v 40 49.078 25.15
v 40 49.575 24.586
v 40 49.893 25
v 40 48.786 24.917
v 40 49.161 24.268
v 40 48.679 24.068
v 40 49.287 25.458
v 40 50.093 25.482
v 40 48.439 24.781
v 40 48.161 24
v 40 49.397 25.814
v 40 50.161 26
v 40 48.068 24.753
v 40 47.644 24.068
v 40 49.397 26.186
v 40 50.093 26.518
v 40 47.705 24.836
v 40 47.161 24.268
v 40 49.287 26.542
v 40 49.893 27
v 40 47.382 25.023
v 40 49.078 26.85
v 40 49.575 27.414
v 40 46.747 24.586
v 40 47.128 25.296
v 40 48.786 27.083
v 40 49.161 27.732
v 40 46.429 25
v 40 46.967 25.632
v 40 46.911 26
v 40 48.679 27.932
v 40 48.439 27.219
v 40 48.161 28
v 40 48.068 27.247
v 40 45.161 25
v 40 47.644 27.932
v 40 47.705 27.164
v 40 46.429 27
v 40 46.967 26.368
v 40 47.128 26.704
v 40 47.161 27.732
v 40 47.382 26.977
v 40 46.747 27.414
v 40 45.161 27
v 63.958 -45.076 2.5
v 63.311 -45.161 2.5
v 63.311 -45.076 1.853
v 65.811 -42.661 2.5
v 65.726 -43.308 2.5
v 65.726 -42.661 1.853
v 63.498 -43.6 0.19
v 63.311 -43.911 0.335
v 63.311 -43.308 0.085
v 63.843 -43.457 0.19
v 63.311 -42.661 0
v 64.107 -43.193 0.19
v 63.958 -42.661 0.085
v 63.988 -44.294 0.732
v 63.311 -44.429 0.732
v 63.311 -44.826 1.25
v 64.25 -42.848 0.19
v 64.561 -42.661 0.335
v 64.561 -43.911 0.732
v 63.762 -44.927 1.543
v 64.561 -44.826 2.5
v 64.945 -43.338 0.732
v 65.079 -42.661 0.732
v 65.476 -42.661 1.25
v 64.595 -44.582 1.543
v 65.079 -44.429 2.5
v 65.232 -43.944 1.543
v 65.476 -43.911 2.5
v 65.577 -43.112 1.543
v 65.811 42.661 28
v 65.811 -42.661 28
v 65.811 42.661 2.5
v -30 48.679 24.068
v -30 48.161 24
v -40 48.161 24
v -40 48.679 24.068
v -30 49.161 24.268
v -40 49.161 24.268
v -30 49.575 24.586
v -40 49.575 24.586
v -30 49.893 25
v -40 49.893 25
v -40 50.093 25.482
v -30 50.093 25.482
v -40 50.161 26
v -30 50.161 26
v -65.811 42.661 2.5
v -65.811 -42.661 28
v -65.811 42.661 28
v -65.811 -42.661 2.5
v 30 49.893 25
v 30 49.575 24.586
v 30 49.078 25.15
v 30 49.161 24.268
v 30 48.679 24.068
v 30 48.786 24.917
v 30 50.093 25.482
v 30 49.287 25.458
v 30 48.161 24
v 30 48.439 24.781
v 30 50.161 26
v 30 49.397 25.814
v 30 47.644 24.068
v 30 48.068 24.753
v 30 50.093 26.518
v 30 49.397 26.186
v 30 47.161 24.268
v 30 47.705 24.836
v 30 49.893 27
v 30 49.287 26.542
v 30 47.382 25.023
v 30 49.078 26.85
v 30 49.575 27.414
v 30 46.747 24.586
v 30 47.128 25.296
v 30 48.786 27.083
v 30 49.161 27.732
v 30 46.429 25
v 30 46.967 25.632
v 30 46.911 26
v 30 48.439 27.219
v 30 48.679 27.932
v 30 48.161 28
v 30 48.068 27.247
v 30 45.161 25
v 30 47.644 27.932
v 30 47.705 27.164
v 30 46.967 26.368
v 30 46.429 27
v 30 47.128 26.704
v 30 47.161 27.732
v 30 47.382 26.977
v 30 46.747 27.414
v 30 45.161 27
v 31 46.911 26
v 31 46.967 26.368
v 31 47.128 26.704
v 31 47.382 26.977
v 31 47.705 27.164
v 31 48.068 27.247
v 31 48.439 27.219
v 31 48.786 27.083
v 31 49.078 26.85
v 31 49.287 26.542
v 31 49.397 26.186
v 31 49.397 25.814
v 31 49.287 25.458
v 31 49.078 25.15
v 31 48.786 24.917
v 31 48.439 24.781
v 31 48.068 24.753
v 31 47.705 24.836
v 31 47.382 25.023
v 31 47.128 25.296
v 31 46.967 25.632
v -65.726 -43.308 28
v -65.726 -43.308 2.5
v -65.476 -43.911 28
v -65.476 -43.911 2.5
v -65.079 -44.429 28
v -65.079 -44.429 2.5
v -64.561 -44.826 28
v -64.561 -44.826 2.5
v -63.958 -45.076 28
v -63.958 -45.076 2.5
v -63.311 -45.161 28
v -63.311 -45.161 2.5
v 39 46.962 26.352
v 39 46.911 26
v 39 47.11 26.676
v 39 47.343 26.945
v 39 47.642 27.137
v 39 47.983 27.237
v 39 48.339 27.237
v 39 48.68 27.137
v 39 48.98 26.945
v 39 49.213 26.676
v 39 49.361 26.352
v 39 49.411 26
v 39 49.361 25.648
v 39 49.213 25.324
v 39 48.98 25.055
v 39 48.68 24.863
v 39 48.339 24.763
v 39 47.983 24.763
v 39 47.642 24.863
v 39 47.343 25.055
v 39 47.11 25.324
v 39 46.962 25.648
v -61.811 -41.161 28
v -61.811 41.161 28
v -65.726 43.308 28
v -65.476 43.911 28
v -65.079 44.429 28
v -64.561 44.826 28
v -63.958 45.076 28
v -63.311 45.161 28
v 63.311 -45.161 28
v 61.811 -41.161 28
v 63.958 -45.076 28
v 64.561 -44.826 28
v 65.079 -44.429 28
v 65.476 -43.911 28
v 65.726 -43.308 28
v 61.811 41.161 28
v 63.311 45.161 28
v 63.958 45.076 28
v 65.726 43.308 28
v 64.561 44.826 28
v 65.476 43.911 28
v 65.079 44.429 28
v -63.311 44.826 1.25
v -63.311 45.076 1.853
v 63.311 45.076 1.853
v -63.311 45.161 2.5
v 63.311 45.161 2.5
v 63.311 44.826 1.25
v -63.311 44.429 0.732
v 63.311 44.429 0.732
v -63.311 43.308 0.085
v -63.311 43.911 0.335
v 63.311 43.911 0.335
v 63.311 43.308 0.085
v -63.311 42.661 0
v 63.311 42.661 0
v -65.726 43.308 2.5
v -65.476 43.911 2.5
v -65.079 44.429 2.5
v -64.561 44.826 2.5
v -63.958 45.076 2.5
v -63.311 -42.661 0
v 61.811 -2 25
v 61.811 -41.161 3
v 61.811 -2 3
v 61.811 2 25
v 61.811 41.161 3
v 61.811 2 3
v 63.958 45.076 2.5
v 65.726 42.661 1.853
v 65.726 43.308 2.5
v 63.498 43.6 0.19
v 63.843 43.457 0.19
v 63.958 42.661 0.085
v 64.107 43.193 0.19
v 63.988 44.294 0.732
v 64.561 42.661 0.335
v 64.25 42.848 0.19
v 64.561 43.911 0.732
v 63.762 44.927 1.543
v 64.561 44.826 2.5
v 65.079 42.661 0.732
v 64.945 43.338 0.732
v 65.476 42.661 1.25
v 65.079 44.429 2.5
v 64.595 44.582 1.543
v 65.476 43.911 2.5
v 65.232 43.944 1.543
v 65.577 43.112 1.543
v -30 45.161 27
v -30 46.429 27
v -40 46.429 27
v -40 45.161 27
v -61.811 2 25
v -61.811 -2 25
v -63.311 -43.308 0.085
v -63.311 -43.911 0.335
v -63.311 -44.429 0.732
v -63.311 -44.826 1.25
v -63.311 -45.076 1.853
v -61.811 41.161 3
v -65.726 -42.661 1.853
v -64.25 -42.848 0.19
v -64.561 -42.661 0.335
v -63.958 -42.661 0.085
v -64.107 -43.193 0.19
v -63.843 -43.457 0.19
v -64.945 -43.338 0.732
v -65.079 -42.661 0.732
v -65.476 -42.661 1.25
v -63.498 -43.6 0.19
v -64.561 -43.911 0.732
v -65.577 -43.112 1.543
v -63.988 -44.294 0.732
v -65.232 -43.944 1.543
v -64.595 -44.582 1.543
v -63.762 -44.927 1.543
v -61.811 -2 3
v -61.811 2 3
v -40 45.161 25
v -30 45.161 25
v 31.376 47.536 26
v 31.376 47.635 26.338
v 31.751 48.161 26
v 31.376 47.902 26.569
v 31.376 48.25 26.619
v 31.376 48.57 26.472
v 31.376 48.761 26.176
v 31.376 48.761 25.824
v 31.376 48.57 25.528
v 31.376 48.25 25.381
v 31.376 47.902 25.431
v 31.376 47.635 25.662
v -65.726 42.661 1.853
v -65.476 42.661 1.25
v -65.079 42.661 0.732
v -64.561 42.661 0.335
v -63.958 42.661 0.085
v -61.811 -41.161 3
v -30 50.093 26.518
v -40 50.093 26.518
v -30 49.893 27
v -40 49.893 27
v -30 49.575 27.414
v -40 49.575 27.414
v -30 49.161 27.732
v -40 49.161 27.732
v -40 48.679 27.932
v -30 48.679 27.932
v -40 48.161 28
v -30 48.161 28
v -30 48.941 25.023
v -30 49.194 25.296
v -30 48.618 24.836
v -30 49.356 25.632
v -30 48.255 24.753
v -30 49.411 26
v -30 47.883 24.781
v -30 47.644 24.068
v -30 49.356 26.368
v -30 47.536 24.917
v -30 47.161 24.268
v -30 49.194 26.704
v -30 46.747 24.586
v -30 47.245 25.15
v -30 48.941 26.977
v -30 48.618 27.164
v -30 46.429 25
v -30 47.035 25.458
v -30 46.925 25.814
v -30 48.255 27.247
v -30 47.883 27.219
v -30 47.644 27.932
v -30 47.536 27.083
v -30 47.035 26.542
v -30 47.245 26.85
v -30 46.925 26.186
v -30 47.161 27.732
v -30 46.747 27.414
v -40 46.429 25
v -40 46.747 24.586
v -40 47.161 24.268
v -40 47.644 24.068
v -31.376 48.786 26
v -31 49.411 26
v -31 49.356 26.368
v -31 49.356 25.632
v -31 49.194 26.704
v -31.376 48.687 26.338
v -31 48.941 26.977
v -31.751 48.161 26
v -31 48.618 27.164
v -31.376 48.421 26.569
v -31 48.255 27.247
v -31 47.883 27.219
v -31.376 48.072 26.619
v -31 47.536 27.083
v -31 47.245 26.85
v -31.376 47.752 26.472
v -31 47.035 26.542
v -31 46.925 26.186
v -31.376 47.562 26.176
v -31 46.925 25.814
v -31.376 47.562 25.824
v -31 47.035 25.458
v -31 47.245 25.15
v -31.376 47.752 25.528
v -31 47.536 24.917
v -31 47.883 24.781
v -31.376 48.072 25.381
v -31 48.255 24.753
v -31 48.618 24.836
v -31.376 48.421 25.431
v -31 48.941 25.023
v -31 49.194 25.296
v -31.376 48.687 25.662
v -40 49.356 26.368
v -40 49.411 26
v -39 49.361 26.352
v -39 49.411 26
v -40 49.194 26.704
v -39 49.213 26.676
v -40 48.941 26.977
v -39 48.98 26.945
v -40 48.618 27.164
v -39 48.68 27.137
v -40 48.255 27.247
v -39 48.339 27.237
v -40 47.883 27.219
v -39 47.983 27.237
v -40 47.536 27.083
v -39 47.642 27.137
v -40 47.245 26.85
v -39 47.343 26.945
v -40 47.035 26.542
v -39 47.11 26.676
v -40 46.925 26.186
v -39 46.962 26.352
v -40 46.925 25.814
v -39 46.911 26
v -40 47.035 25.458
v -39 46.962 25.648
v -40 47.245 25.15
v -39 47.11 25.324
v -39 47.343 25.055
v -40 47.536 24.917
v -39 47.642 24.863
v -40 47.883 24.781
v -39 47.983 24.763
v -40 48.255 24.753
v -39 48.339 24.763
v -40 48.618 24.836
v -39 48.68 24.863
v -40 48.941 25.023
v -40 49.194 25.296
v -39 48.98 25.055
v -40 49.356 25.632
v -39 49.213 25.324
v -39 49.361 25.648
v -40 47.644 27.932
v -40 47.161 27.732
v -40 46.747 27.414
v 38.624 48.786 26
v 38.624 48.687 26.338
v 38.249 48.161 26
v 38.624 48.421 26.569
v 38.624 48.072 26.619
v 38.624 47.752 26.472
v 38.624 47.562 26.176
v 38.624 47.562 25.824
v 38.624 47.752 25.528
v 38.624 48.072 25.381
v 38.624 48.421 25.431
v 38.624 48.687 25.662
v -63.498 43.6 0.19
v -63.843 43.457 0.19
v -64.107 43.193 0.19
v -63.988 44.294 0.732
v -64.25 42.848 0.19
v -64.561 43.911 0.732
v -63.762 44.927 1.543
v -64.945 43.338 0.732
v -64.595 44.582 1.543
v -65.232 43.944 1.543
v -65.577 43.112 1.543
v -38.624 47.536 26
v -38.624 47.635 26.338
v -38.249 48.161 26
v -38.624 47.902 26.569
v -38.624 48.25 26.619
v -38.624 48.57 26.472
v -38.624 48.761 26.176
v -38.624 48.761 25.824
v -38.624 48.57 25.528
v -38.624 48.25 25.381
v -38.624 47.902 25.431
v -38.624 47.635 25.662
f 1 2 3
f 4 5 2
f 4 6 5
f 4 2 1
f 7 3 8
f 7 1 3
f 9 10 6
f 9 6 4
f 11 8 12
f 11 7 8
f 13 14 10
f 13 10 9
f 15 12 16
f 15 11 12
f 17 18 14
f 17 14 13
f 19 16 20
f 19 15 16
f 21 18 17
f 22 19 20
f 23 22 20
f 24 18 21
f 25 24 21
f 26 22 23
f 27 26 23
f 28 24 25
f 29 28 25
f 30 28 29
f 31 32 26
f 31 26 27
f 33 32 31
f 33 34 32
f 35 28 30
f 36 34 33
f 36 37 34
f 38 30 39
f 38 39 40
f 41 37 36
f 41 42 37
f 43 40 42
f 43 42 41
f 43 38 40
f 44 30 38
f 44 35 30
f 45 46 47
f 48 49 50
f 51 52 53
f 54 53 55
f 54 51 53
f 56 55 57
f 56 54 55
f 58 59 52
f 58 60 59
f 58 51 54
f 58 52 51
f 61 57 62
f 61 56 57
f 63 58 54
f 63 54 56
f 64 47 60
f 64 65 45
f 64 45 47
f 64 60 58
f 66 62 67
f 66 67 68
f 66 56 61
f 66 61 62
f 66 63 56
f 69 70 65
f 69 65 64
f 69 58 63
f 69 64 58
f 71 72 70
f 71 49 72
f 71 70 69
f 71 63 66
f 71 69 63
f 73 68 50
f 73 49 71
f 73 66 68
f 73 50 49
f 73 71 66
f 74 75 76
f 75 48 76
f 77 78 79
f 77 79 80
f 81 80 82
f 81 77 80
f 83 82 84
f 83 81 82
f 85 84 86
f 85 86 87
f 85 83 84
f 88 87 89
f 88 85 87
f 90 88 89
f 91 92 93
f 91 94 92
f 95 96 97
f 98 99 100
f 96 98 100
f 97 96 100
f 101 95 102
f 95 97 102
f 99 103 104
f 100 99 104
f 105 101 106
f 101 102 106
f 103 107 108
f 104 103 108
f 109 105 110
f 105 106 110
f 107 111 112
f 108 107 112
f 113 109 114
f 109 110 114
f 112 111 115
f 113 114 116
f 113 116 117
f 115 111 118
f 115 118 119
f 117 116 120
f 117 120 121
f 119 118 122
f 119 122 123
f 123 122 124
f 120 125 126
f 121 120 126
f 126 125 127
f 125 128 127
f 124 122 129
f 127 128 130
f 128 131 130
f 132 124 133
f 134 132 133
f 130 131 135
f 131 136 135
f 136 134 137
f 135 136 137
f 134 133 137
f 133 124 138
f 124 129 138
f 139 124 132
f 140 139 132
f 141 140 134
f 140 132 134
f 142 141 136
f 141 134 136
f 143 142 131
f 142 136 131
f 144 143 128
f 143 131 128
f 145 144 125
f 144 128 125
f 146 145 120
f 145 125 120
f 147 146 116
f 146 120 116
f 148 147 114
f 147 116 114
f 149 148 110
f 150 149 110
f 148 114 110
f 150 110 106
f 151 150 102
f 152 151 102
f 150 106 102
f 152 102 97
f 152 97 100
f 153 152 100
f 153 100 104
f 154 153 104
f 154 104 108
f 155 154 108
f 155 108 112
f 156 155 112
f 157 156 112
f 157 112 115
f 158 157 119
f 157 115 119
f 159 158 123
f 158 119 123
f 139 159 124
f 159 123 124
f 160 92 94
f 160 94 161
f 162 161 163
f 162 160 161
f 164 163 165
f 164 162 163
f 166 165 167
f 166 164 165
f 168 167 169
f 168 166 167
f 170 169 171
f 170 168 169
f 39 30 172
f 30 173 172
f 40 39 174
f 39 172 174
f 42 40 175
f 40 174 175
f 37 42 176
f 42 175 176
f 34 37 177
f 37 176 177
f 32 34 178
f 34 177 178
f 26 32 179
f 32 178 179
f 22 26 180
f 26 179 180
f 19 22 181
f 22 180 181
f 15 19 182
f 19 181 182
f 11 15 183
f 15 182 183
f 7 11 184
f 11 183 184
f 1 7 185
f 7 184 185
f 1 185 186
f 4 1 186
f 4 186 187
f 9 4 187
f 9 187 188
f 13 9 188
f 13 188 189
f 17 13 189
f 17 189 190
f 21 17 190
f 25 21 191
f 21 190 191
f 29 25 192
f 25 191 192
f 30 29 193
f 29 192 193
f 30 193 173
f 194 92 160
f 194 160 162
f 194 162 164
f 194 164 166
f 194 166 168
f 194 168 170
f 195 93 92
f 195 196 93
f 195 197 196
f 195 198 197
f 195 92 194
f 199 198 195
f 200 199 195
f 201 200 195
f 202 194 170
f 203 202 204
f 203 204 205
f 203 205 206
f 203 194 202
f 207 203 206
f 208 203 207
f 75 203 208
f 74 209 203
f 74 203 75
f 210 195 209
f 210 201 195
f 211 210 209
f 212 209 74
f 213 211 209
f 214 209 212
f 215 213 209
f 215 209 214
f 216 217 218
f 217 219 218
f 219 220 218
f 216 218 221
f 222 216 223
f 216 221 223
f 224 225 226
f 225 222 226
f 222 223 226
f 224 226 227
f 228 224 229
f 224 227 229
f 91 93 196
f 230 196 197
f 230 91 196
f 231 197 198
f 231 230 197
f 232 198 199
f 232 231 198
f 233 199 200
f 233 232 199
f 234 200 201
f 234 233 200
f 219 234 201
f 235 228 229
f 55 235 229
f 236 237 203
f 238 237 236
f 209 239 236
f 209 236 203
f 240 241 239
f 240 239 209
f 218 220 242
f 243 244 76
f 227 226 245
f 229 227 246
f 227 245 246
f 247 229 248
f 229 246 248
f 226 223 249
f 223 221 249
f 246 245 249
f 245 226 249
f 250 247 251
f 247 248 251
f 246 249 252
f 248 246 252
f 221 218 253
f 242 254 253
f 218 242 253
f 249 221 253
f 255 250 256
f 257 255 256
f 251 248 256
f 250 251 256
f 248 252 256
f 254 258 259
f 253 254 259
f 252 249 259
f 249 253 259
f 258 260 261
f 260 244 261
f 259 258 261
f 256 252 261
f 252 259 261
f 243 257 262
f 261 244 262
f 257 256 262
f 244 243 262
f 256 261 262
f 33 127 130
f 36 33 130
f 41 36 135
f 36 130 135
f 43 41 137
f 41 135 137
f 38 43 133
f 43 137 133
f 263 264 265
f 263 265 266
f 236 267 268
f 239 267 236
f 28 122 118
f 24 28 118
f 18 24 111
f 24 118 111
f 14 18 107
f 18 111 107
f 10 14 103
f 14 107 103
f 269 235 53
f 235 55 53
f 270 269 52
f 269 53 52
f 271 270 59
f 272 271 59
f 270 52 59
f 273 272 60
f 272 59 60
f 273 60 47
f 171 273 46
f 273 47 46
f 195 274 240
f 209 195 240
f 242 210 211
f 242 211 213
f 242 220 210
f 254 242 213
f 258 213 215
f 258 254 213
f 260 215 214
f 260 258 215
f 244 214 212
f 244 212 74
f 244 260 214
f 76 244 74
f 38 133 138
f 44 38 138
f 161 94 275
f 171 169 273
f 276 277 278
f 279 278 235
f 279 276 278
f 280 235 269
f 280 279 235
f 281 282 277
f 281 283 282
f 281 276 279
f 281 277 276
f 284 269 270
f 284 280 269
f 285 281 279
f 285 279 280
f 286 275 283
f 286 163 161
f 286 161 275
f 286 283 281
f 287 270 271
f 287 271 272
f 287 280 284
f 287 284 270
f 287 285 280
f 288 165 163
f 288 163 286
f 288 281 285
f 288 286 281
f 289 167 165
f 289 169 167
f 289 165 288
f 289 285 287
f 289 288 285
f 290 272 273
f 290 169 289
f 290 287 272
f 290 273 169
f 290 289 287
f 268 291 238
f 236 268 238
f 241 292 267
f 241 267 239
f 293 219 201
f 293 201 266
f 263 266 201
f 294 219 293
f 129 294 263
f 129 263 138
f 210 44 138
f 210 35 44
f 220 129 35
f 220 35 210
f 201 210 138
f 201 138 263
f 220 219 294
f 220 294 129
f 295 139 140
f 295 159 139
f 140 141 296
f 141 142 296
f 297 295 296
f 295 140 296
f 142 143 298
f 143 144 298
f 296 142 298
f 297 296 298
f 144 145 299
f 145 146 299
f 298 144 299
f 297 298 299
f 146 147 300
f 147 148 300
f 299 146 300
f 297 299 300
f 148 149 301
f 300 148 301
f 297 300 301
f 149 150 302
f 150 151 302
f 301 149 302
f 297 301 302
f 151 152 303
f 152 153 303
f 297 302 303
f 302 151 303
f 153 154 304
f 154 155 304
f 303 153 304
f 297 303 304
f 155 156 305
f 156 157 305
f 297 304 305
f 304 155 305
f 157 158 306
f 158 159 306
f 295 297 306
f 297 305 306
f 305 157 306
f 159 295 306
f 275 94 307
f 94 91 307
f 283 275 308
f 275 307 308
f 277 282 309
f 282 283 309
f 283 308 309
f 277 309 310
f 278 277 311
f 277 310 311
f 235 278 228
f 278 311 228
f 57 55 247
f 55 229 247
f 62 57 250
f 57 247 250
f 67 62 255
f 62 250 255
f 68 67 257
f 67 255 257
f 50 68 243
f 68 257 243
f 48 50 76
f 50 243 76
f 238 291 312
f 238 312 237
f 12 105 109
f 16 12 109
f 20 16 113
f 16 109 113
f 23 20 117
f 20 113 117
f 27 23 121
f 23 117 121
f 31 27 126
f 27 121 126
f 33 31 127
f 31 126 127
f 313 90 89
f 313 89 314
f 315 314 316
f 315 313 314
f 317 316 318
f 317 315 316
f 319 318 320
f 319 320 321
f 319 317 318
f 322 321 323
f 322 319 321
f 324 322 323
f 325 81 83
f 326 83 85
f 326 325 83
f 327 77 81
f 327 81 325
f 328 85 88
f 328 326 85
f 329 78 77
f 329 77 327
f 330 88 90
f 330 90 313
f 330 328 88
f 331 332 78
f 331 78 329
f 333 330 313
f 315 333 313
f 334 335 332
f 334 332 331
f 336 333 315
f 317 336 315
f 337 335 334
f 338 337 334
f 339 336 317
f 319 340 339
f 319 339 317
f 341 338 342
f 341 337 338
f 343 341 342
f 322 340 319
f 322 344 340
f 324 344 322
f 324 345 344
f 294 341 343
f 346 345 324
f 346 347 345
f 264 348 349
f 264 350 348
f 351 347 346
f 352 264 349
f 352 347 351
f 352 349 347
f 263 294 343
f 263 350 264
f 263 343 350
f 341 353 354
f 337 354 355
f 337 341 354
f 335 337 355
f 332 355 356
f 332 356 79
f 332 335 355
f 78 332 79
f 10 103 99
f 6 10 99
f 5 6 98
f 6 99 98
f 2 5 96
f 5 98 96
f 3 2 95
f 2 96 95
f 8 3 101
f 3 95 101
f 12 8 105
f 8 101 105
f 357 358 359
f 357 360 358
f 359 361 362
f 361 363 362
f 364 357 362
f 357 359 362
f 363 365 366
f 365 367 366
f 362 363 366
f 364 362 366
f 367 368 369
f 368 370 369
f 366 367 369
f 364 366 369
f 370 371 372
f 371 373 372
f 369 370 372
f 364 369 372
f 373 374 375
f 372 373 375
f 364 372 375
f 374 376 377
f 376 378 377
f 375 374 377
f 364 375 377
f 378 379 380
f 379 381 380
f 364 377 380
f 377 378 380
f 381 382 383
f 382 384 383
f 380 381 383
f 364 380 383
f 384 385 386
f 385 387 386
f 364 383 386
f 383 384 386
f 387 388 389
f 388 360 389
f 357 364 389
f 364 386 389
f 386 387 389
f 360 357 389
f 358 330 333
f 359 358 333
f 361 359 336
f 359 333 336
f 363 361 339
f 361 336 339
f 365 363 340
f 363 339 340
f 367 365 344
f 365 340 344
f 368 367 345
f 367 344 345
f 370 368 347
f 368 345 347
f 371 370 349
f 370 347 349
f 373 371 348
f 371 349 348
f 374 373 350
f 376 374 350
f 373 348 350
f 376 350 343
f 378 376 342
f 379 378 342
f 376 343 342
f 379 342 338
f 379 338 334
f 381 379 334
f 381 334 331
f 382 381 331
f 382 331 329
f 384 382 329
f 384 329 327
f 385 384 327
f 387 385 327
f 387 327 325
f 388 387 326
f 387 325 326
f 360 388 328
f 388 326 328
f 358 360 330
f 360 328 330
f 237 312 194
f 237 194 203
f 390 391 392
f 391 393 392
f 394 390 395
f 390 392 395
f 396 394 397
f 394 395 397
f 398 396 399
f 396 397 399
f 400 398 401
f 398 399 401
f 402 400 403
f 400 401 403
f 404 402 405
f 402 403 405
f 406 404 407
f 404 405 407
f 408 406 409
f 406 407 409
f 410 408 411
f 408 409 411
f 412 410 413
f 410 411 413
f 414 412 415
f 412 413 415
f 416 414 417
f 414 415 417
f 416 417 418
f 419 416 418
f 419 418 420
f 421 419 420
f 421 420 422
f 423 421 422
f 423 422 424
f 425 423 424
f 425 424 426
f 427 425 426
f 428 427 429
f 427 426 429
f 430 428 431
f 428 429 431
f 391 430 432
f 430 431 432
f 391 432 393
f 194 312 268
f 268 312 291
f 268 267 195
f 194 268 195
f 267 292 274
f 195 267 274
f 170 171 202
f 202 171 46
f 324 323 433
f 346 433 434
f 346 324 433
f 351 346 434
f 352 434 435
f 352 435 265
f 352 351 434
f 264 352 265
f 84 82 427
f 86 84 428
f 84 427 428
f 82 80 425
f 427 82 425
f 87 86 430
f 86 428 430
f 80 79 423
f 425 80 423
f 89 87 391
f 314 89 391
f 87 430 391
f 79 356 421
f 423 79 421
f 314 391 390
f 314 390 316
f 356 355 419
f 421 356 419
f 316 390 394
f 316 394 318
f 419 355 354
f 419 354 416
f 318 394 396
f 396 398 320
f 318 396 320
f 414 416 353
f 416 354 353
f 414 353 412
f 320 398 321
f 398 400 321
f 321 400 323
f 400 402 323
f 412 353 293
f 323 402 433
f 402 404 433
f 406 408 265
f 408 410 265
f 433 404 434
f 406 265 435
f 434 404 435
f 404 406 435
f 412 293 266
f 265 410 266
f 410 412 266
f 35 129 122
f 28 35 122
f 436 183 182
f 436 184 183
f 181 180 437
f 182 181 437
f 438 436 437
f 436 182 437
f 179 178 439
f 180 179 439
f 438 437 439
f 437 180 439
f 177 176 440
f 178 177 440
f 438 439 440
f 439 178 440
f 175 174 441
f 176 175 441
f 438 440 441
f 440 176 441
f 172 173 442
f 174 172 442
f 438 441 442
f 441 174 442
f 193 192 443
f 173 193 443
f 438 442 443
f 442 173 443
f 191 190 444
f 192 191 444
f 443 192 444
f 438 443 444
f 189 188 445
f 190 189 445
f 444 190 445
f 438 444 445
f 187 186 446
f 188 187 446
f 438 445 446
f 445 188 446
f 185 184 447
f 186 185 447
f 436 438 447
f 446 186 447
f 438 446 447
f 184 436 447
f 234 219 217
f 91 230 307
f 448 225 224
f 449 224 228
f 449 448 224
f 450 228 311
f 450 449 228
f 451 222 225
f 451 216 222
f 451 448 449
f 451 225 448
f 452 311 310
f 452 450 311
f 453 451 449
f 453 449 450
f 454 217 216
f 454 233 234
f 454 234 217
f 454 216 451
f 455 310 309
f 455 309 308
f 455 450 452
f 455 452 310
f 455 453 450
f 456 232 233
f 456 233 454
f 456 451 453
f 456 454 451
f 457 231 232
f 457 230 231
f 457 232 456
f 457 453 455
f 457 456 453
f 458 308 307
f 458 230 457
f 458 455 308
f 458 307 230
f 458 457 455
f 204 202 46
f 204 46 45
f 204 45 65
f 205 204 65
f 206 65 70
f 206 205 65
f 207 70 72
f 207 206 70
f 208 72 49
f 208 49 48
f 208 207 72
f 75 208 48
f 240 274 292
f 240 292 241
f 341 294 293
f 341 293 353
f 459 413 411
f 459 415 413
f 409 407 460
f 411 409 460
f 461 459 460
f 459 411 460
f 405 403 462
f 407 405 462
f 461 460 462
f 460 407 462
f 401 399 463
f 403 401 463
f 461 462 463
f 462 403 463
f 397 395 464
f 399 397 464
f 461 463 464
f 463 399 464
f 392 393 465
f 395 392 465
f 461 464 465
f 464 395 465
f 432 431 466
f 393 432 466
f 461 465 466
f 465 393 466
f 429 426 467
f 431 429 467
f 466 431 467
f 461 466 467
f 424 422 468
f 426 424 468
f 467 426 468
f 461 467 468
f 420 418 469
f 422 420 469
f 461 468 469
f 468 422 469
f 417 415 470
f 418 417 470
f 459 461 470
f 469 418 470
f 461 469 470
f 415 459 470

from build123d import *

# Parameters (mm, degrees)
F0_W           = 131.6228
F0_H           = 90.3224
F1_DEPTH       = 3
F2_W           = 131.6228
F2_H           = 90.3224
F2_W_2         = 123.6228
F2_H_2         = 82.3224
F3_DEPTH       = 25
F4_W           = 123.6228
F4_H           = 4
F5_DEPTH       = 25
F6_R           = 2.5
F7_W           = 10
F7_H           = 4
F8_DEPTH       = 5
F10_DEPTH      = 25
F10_DEPTH_BACK = 95.8124
F12_D          = 2.5
F12_DEPTH      = 1
F12_TIP        = 0.7510757738
F14_D          = 2.5
F14_DEPTH      = 1
F14_TIP        = 0.7510757738
F16_D          = 2.5
F16_DEPTH      = 1
F16_TIP        = 0.7510757738
F18_D          = 2.5
F18_DEPTH      = 1
F18_TIP        = 0.7510757738
F19_W          = 123.6228
F19_H          = 82.3224
F20_DEPTH      = 3


with BuildPart() as f1:
    # F0 (on Top) → F1 (new body)
    with BuildSketch(Plane.XY):
        Rectangle(F0_W, F0_H)
    extrude(amount=F1_DEPTH)

    # F2 (on face) → F3 (join)
    with BuildSketch(Plane.XY.offset(3)):
        Rectangle(F2_W, F2_H)
        Rectangle(F2_W_2, F2_H_2, mode=Mode.SUBTRACT)
    extrude(amount=F3_DEPTH)

    # F4 (on face) → F5 (join)
    with BuildSketch(Plane.XY.offset(3)):
        Rectangle(F4_W, F4_H)
    extrude(amount=F5_DEPTH)

    # F6
    f6_edges = [f1.edges().sort_by_distance(p)[0] for p in [
        (65.8114, 45.1612, 14),
        (65.8114, -45.1612, 14),
        (-65.8114, -45.1612, 14),
        (-65.8114, 45.1612, 14),
        (0, 45.1612, 0),
        (-65.8114, 0, 0),
        (0, -45.1612, 0),
        (65.8114, 0, 0),
    ]]
    fillet(f6_edges, radius=F6_R)

    # F7 (on face) → F8 (join)
    with BuildSketch(Plane(origin=(0, 45.1612, 0), x_dir=(-1, 0, 0), z_dir=(0, 1, 0))):
        with Locations((-35, 26)):
            Rectangle(F7_W, F7_H)
        with Locations((35, 26)):
            Rectangle(F7_W, F7_H)
    extrude(amount=F8_DEPTH)

    # F9 (on face) → F10 (cut, two sides)
    with BuildSketch(Plane(origin=(30, 0, 0), x_dir=(0, -1, 0), z_dir=(-1, 0, 0))) as f10_sk:
        with BuildLine():
            ThreePointArc((-50.1612, 26), (-49.5754135624, 27.4142135624), (-48.1612, 28))
            Line((-48.1612, 28), (-50.1612, 28))
            Line((-50.1612, 28), (-50.1612, 26))
        make_face()
        with BuildLine():
            Line((-50.1612, 24), (-48.1612, 24))
            ThreePointArc((-48.1612, 24), (-49.5754135624, 24.5857864376), (-50.1612, 26))
            Line((-50.1612, 26), (-50.1612, 24))
        make_face()
        with BuildLine():
            Line((-45.1612, 25), (-46.4291491924, 25))
            ThreePointArc((-46.4291491924, 25), (-47.1612, 24.2679491924), (-48.1612, 24))
            Line((-48.1612, 24), (-45.1612, 24))
            Line((-45.1612, 24), (-45.1612, 25))
        make_face()
        with BuildLine():
            ThreePointArc((-48.1612, 28), (-47.1612, 27.7320508076), (-46.4291491924, 27))
            Line((-46.4291491924, 27), (-45.1612, 27))
            Line((-45.1612, 27), (-45.1612, 28))
            Line((-45.1612, 28), (-48.1612, 28))
        make_face()
    extrude(amount=-F10_DEPTH, mode=Mode.SUBTRACT)
    extrude(f10_sk.sketch, amount=F10_DEPTH_BACK, mode=Mode.SUBTRACT)

    # F12 (one way)
    with BuildSketch(Plane(origin=(30, 0, 0), x_dir=(0, -1, 0), z_dir=(-1, 0, 0))):
        with Locations((-48.1612, 26)):
            Circle(F12_D / 2)
    extrude(amount=-F12_DEPTH, mode=Mode.SUBTRACT)
    with Locations(Plane(origin=(30, 0, 0), x_dir=(0, -1, 0), z_dir=(-1, 0, 0))):
        with Locations((-48.1612, 26)):
            with Locations((0, 0, -(F12_DEPTH + F12_TIP / 2))):  # 118° drill point
                Cone(0, F12_D / 2, F12_TIP, mode=Mode.SUBTRACT)

    # F14
    with Locations(Plane.YZ.offset(40)):
        with Locations((48.1612, 26)):
            Hole(F14_D / 2, depth=F14_DEPTH)
            with Locations((0, 0, -(F14_DEPTH + F14_TIP / 2))):  # 118° drill point
                Cone(0, F14_D / 2, F14_TIP, mode=Mode.SUBTRACT)

    # F16 (one way)
    with BuildSketch(Plane.YZ.offset(-30)):
        with Locations((48.1612, 26)):
            Circle(F16_D / 2)
    extrude(amount=-F16_DEPTH, mode=Mode.SUBTRACT)
    with Locations(Plane.YZ.offset(-30)):
        with Locations((48.1612, 26)):
            with Locations((0, 0, -(F16_DEPTH + F16_TIP / 2))):  # 118° drill point
                Cone(0, F16_D / 2, F16_TIP, mode=Mode.SUBTRACT)

    # F18
    with Locations(Plane(origin=(-40, 0, 0), x_dir=(0, -1, 0), z_dir=(-1, 0, 0))):
        with Locations((-48.1612, 26)):
            Hole(F18_D / 2, depth=F18_DEPTH)
            with Locations((0, 0, -(F18_DEPTH + F18_TIP / 2))):  # 118° drill point
                Cone(0, F18_D / 2, F18_TIP, mode=Mode.SUBTRACT)

    # F19 (on face) → F20 (cut)
    with BuildSketch(Plane.XY.offset(28)):
        Rectangle(F19_W, F19_H)
    extrude(amount=-F20_DEPTH, mode=Mode.SUBTRACT)


solid = f1.part
